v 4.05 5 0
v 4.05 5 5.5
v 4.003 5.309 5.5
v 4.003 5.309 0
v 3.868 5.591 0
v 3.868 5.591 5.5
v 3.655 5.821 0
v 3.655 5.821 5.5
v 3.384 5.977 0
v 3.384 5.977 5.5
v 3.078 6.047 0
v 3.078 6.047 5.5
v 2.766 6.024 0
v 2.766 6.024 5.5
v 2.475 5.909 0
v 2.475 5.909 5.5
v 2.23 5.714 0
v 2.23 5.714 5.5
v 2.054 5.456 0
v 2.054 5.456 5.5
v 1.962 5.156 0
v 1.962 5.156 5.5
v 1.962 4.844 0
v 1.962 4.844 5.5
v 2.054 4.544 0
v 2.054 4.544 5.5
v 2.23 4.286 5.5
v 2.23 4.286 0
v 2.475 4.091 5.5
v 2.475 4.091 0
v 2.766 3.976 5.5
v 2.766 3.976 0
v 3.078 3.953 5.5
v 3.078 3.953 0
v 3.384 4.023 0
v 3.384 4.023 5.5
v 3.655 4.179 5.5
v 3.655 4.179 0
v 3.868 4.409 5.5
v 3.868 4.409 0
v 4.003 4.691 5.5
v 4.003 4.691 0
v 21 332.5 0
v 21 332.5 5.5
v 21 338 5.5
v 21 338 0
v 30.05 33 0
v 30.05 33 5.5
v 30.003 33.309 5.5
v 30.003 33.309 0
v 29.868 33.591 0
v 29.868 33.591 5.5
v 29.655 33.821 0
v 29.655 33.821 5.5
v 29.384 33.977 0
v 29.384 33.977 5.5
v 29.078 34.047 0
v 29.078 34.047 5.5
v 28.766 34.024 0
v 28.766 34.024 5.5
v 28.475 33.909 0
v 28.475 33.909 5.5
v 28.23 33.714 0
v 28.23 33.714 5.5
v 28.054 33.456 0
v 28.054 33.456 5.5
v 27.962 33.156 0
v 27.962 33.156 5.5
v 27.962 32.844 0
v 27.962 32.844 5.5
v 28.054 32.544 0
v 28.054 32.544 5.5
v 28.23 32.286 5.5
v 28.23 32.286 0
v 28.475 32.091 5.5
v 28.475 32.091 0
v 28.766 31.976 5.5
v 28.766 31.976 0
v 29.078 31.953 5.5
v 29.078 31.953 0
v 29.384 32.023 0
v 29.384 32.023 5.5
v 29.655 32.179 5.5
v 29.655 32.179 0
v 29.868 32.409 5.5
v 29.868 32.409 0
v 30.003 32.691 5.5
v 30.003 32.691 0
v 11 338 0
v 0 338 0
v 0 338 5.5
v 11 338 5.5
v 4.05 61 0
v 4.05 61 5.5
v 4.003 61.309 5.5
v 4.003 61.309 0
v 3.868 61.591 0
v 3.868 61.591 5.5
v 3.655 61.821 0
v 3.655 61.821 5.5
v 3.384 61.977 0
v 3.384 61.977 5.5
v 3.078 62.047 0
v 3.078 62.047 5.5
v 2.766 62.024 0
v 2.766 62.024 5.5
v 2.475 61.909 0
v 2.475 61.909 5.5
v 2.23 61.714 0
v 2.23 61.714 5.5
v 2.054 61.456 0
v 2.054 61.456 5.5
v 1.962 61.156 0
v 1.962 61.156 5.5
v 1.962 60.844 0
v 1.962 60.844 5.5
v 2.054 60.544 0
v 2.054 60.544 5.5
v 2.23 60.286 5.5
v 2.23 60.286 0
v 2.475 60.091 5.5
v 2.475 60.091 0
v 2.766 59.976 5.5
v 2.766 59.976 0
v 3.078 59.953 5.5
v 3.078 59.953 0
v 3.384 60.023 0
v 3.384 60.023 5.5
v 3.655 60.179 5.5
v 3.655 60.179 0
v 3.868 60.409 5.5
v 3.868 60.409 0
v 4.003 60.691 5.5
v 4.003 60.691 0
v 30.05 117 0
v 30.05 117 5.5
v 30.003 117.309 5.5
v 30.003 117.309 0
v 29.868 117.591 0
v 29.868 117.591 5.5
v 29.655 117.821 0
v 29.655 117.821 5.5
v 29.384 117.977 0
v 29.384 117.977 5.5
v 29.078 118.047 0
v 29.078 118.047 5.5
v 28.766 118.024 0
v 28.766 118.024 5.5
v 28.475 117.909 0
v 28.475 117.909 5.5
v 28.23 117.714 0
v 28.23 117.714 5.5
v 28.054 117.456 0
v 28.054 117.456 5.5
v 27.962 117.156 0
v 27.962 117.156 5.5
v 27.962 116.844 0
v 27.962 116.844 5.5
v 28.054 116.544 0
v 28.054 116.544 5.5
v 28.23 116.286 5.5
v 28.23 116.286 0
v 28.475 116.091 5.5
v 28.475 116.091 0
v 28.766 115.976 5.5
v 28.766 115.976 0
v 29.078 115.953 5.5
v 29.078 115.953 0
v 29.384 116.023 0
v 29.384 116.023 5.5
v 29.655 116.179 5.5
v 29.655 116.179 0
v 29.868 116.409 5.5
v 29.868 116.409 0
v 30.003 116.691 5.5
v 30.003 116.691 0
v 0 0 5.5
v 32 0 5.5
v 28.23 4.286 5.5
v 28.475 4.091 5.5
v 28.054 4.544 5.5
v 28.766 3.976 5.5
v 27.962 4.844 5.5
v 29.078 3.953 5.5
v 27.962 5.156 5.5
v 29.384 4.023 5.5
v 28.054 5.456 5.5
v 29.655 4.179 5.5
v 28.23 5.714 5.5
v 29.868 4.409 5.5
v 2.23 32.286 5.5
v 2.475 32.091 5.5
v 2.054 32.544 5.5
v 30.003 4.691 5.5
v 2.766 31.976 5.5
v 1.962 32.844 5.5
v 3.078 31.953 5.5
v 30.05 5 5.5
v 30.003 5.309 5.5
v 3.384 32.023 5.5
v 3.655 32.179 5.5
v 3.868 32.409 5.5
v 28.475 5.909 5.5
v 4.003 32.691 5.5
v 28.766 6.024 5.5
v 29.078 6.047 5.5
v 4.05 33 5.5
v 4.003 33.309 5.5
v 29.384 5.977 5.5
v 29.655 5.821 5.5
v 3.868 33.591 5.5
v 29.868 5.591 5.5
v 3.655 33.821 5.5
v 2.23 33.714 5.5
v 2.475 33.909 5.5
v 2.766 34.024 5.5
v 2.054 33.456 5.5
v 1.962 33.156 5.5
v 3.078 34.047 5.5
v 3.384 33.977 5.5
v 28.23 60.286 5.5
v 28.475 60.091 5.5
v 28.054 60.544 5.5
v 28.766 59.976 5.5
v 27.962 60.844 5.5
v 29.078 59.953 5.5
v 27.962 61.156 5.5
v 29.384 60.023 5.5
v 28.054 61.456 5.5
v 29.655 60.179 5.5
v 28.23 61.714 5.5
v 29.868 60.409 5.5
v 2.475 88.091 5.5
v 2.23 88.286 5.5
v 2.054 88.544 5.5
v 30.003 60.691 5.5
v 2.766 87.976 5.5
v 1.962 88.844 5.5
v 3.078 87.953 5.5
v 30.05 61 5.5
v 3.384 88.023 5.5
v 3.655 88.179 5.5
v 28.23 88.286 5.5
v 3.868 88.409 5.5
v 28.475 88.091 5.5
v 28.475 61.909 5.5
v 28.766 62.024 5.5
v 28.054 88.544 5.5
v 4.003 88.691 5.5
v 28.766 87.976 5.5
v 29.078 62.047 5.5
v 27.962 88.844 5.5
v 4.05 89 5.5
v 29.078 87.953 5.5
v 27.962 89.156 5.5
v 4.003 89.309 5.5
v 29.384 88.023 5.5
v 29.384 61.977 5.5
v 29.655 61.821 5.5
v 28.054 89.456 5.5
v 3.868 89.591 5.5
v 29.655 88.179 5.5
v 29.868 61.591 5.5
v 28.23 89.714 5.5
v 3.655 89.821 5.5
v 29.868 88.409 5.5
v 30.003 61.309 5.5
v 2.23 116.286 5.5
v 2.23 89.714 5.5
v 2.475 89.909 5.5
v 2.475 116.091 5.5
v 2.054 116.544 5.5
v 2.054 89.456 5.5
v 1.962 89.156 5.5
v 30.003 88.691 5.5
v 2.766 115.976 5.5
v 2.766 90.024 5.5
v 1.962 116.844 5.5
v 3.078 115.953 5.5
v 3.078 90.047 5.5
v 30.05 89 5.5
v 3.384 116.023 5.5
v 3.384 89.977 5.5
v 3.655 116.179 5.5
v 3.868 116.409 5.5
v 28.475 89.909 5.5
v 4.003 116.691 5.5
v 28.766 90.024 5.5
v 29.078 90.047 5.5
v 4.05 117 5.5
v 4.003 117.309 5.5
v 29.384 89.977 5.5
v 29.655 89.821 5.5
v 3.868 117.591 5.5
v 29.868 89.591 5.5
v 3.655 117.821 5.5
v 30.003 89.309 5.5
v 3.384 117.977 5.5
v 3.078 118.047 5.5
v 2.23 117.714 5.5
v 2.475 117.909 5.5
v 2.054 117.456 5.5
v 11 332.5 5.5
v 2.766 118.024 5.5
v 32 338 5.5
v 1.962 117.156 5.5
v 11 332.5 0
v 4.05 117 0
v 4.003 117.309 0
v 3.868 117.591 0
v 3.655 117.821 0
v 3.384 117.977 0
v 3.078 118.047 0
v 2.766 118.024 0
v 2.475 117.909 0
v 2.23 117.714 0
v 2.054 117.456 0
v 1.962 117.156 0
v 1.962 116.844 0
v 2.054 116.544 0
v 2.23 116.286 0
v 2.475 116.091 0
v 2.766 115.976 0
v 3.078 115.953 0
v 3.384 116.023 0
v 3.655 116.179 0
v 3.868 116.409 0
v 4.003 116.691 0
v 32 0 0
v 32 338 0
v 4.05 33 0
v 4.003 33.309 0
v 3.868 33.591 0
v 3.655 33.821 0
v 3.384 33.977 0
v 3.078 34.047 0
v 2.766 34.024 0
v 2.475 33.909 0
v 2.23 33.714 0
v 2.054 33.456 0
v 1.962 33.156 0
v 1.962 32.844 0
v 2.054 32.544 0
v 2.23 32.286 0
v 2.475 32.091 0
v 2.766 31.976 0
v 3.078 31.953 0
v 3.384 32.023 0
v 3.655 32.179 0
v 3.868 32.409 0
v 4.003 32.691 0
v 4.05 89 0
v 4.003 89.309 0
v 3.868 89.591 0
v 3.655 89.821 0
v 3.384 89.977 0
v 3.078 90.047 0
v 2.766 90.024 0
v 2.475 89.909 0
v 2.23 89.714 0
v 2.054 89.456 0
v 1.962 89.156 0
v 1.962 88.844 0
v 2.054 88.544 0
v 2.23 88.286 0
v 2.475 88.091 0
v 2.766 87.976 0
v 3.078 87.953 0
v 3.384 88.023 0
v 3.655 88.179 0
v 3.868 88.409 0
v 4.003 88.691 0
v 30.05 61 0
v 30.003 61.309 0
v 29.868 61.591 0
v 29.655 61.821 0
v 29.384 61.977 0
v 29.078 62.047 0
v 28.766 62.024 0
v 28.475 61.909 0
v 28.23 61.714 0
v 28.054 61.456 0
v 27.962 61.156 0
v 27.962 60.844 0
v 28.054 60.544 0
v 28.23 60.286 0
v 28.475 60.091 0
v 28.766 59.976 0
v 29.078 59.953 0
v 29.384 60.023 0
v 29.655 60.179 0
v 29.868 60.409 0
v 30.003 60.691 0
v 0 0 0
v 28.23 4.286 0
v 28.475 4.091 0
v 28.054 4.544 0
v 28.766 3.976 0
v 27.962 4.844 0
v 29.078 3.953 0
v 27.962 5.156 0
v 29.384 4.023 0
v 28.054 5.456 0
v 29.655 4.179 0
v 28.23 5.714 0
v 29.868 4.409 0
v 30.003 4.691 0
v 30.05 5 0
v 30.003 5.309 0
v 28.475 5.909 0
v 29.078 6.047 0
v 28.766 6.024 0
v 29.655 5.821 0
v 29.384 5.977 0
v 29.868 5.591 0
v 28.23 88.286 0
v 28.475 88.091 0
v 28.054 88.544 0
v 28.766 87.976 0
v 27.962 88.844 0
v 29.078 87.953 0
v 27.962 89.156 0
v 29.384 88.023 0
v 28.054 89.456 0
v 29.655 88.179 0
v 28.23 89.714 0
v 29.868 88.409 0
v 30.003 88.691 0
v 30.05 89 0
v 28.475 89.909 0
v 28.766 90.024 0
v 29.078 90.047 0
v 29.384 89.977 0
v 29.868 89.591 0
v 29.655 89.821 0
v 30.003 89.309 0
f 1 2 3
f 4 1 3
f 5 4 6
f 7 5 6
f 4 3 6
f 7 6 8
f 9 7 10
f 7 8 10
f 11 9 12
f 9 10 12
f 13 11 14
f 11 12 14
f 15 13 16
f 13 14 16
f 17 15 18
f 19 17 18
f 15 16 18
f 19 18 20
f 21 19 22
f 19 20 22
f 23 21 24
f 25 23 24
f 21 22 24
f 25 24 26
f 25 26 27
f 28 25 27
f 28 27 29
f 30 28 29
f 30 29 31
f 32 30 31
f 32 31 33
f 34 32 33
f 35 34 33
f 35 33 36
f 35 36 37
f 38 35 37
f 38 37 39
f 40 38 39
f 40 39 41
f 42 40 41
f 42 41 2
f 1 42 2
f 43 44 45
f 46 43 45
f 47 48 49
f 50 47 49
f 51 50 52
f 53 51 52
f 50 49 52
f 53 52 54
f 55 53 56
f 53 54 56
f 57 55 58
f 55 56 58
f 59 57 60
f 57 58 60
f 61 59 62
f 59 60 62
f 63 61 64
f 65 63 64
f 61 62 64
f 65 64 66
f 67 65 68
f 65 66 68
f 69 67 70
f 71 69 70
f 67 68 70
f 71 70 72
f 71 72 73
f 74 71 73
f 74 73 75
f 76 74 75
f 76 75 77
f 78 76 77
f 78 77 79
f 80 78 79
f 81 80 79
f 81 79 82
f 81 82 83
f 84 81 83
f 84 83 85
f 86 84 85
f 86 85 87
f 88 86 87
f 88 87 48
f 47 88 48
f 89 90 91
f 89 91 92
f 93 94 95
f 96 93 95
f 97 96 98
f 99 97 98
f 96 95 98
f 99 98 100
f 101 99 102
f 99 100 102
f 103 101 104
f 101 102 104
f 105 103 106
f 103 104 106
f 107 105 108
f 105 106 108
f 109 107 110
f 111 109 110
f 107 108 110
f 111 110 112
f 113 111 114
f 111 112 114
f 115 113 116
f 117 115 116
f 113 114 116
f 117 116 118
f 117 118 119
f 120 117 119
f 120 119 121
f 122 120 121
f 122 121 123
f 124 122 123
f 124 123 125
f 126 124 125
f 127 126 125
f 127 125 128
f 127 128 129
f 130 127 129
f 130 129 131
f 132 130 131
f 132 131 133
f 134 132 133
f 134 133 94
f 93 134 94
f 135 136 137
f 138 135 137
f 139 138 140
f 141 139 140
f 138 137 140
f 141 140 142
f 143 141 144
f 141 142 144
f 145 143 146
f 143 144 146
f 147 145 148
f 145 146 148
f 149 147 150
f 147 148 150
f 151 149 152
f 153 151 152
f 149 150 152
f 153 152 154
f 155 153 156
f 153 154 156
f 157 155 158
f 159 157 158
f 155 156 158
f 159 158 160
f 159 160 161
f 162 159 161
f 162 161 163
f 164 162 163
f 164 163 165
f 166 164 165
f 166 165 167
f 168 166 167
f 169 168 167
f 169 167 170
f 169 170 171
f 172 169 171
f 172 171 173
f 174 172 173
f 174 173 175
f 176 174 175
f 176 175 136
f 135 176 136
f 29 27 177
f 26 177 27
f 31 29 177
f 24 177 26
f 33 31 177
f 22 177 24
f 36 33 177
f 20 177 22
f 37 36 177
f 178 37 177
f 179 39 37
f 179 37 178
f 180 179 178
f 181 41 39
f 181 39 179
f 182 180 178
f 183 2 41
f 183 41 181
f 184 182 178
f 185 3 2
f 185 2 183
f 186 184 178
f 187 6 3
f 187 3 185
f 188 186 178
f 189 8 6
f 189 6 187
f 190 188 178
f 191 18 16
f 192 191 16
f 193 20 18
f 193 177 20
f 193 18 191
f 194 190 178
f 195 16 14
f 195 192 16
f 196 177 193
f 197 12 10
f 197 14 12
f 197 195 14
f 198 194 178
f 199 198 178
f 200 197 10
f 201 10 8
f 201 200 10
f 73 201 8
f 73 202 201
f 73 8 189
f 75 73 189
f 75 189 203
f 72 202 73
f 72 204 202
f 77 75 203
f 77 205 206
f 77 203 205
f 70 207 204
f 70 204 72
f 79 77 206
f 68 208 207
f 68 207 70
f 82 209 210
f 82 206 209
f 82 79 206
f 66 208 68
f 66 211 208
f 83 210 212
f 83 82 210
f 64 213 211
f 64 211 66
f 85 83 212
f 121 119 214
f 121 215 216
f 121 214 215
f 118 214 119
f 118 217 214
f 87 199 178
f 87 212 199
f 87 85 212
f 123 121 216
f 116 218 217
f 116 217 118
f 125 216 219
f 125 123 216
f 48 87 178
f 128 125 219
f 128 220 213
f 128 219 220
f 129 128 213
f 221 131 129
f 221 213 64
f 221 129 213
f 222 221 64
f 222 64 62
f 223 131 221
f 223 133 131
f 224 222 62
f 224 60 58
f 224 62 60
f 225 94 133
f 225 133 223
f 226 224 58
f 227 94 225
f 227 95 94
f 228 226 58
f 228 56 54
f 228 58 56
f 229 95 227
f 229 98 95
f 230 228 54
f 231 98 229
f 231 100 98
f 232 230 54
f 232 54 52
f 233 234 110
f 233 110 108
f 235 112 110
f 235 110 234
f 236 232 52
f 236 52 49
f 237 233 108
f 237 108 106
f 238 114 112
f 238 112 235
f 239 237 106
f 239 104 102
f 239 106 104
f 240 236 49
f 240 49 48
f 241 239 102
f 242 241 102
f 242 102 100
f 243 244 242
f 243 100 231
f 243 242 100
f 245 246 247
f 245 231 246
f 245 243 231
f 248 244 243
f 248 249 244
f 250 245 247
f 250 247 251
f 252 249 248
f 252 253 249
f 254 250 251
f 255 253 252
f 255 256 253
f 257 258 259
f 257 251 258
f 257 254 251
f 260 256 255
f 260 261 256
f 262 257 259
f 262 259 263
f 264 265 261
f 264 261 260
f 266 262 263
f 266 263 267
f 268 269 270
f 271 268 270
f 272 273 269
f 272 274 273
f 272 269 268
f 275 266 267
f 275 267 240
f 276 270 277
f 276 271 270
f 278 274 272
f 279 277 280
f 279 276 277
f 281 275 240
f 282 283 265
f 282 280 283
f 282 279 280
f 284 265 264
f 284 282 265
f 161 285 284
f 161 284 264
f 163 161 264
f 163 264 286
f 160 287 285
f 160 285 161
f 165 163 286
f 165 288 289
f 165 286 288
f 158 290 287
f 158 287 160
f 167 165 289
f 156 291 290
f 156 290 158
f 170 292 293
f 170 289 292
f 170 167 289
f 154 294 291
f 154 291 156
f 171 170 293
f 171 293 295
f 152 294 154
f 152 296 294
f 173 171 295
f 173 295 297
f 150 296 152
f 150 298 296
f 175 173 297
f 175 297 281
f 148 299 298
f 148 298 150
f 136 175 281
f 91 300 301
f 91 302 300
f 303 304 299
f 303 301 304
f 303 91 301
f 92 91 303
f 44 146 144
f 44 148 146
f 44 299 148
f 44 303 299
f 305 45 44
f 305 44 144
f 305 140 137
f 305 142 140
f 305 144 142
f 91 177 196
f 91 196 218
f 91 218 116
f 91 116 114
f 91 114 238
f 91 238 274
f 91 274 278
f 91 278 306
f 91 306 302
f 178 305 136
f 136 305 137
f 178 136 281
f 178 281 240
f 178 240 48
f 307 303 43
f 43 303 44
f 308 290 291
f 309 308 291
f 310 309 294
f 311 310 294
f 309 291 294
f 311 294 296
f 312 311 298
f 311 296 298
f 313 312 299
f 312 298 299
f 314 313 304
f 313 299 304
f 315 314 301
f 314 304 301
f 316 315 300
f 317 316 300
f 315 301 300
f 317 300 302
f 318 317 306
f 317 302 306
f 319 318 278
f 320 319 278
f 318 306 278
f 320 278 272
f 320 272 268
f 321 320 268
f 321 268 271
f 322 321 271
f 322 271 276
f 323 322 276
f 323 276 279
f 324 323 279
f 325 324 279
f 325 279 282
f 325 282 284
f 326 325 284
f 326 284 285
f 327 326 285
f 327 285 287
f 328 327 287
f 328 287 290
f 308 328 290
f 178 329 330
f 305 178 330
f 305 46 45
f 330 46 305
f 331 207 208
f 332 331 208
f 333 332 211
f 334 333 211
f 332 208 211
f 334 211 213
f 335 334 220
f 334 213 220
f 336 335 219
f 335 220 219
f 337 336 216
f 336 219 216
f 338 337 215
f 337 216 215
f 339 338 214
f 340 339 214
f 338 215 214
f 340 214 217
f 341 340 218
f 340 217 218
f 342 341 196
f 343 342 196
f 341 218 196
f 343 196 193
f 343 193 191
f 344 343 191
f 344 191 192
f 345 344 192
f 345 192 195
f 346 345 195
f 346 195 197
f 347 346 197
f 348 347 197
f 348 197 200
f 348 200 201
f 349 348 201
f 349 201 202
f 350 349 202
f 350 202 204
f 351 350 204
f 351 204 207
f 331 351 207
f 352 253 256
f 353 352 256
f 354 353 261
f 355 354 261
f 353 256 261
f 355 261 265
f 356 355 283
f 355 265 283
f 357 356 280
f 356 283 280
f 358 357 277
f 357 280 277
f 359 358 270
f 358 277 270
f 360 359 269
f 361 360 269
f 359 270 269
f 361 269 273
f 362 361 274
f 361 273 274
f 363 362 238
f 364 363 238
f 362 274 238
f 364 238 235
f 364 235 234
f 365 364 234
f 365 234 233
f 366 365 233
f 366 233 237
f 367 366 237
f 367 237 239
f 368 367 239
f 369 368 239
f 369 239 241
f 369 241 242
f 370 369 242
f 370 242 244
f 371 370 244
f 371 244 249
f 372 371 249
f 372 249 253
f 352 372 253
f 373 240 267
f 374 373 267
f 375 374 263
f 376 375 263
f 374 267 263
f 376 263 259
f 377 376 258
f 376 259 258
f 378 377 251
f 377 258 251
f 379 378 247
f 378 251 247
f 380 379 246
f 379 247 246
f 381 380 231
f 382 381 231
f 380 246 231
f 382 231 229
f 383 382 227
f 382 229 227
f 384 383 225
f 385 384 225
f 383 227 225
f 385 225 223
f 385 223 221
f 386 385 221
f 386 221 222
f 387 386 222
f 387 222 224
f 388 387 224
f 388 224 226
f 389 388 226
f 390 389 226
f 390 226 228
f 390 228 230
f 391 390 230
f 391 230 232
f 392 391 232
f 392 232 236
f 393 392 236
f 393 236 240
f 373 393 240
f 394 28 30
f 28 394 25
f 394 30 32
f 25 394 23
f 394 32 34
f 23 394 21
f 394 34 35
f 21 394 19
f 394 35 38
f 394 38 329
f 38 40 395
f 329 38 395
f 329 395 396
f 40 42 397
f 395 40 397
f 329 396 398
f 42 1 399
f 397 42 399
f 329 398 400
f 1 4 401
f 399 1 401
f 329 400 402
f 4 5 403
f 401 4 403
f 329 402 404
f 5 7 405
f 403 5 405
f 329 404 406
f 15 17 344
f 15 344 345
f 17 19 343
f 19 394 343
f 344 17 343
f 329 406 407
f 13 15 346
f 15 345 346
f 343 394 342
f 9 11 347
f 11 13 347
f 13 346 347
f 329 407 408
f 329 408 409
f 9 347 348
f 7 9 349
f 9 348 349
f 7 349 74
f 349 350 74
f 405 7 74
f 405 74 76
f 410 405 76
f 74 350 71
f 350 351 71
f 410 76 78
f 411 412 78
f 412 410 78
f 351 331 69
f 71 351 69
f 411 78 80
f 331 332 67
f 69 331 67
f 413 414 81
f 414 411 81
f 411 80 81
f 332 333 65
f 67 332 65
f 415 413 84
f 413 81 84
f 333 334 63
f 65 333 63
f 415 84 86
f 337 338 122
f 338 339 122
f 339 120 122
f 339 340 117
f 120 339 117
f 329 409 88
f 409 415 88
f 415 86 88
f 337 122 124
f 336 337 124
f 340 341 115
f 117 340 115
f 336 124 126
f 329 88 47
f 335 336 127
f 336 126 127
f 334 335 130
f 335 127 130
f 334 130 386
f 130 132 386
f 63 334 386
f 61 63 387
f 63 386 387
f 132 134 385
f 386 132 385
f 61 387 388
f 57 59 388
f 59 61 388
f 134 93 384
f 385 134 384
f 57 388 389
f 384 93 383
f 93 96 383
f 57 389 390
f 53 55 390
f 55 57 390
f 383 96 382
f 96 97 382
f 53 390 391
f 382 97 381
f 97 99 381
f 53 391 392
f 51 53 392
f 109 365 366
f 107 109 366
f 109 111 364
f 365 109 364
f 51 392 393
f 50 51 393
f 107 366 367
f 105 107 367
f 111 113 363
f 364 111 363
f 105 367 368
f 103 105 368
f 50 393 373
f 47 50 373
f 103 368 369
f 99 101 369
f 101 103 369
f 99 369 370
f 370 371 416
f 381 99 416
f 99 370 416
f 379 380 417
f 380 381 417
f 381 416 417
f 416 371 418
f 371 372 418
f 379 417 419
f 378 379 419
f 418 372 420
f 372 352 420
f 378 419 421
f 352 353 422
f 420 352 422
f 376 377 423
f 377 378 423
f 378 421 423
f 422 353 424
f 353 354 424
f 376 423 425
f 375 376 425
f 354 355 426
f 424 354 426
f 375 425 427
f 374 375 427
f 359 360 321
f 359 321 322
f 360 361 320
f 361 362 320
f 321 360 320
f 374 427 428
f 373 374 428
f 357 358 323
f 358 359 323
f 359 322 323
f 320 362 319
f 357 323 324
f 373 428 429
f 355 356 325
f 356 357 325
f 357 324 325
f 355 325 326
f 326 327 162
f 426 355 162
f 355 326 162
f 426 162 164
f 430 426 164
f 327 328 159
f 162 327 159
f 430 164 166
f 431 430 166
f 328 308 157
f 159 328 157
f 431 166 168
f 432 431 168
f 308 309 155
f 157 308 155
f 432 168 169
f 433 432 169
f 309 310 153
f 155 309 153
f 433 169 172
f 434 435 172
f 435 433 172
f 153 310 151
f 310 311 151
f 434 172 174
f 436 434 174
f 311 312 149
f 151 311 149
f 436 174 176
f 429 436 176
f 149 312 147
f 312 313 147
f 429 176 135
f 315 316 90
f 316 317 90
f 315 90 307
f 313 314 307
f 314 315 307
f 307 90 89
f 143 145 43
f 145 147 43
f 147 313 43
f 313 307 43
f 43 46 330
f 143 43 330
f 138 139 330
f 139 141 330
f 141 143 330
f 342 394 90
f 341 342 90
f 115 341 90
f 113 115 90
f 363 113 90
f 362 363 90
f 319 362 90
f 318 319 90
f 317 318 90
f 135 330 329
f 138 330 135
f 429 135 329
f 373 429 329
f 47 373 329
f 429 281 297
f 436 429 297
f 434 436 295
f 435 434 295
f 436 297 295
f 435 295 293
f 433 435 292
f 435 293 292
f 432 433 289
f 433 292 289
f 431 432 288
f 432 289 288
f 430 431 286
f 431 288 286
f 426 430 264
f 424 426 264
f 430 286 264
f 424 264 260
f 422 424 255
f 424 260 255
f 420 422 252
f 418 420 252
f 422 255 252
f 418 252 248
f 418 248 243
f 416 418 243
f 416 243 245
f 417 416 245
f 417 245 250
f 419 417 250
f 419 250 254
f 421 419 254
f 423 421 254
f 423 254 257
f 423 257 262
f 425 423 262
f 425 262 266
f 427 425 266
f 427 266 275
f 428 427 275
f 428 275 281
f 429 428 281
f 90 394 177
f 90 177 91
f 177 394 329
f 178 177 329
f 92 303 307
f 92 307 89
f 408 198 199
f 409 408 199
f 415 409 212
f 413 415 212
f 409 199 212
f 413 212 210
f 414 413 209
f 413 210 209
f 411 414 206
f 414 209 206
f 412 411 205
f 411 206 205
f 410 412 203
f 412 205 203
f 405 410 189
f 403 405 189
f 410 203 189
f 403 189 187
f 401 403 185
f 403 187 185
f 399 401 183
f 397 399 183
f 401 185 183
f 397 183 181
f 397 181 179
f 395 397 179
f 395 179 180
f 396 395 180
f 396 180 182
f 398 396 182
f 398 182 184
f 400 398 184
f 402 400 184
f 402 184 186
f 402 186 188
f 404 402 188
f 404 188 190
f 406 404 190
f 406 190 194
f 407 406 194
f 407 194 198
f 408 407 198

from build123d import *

# Parameters (mm, degrees)
SKETCH_1_W          = 32
SKETCH_1_H          = 338
EXTRUDE_1_DEPTH     = 5.5
SKETCH_2_W          = 10
SKETCH_2_H          = 5.5
CUT_EXTRUDE_1_DEPTH = 5.5
SKETCH_3_R          = 1.05
CUT_EXTRUDE_2_DEPTH = 10


with BuildPart() as part:
    # ｽｹｯﾁ1 → ﾎﾞｽ - 押し出し1 (new body)
    with BuildSketch(Plane.XY):
        with Locations((16, 169)):
            Rectangle(SKETCH_1_W, SKETCH_1_H)
    extrude(amount=EXTRUDE_1_DEPTH)

    # ｽｹｯﾁ2 → ｶｯﾄ - 押し出し1 (cut)
    with BuildSketch(Plane.XY.offset(5.5)):
        with Locations((16, 335.25)):
            Rectangle(SKETCH_2_W, SKETCH_2_H)
    extrude(amount=-CUT_EXTRUDE_1_DEPTH, mode=Mode.SUBTRACT)

    # ｽｹｯﾁ3 → ｶｯﾄ - 押し出し2 (cut)
    with BuildSketch(Plane.XY.offset(5.5)):
        with Locations((3, 5)):
            Circle(SKETCH_3_R)
        with Locations((29, 5)):
            Circle(SKETCH_3_R)
        with Locations((3, 33)):
            Circle(SKETCH_3_R)
        with Locations((29, 33)):
            Circle(SKETCH_3_R)
        with Locations((3, 61)):
            Circle(SKETCH_3_R)
        with Locations((29, 61)):
            Circle(SKETCH_3_R)
        with Locations((3, 89)):
            Circle(SKETCH_3_R)
        with Locations((29, 89)):
            Circle(SKETCH_3_R)
        with Locations((3, 117)):
            Circle(SKETCH_3_R)
        with Locations((29, 117)):
            Circle(SKETCH_3_R)
    extrude(amount=-CUT_EXTRUDE_2_DEPTH, mode=Mode.SUBTRACT)


solid = part.part
